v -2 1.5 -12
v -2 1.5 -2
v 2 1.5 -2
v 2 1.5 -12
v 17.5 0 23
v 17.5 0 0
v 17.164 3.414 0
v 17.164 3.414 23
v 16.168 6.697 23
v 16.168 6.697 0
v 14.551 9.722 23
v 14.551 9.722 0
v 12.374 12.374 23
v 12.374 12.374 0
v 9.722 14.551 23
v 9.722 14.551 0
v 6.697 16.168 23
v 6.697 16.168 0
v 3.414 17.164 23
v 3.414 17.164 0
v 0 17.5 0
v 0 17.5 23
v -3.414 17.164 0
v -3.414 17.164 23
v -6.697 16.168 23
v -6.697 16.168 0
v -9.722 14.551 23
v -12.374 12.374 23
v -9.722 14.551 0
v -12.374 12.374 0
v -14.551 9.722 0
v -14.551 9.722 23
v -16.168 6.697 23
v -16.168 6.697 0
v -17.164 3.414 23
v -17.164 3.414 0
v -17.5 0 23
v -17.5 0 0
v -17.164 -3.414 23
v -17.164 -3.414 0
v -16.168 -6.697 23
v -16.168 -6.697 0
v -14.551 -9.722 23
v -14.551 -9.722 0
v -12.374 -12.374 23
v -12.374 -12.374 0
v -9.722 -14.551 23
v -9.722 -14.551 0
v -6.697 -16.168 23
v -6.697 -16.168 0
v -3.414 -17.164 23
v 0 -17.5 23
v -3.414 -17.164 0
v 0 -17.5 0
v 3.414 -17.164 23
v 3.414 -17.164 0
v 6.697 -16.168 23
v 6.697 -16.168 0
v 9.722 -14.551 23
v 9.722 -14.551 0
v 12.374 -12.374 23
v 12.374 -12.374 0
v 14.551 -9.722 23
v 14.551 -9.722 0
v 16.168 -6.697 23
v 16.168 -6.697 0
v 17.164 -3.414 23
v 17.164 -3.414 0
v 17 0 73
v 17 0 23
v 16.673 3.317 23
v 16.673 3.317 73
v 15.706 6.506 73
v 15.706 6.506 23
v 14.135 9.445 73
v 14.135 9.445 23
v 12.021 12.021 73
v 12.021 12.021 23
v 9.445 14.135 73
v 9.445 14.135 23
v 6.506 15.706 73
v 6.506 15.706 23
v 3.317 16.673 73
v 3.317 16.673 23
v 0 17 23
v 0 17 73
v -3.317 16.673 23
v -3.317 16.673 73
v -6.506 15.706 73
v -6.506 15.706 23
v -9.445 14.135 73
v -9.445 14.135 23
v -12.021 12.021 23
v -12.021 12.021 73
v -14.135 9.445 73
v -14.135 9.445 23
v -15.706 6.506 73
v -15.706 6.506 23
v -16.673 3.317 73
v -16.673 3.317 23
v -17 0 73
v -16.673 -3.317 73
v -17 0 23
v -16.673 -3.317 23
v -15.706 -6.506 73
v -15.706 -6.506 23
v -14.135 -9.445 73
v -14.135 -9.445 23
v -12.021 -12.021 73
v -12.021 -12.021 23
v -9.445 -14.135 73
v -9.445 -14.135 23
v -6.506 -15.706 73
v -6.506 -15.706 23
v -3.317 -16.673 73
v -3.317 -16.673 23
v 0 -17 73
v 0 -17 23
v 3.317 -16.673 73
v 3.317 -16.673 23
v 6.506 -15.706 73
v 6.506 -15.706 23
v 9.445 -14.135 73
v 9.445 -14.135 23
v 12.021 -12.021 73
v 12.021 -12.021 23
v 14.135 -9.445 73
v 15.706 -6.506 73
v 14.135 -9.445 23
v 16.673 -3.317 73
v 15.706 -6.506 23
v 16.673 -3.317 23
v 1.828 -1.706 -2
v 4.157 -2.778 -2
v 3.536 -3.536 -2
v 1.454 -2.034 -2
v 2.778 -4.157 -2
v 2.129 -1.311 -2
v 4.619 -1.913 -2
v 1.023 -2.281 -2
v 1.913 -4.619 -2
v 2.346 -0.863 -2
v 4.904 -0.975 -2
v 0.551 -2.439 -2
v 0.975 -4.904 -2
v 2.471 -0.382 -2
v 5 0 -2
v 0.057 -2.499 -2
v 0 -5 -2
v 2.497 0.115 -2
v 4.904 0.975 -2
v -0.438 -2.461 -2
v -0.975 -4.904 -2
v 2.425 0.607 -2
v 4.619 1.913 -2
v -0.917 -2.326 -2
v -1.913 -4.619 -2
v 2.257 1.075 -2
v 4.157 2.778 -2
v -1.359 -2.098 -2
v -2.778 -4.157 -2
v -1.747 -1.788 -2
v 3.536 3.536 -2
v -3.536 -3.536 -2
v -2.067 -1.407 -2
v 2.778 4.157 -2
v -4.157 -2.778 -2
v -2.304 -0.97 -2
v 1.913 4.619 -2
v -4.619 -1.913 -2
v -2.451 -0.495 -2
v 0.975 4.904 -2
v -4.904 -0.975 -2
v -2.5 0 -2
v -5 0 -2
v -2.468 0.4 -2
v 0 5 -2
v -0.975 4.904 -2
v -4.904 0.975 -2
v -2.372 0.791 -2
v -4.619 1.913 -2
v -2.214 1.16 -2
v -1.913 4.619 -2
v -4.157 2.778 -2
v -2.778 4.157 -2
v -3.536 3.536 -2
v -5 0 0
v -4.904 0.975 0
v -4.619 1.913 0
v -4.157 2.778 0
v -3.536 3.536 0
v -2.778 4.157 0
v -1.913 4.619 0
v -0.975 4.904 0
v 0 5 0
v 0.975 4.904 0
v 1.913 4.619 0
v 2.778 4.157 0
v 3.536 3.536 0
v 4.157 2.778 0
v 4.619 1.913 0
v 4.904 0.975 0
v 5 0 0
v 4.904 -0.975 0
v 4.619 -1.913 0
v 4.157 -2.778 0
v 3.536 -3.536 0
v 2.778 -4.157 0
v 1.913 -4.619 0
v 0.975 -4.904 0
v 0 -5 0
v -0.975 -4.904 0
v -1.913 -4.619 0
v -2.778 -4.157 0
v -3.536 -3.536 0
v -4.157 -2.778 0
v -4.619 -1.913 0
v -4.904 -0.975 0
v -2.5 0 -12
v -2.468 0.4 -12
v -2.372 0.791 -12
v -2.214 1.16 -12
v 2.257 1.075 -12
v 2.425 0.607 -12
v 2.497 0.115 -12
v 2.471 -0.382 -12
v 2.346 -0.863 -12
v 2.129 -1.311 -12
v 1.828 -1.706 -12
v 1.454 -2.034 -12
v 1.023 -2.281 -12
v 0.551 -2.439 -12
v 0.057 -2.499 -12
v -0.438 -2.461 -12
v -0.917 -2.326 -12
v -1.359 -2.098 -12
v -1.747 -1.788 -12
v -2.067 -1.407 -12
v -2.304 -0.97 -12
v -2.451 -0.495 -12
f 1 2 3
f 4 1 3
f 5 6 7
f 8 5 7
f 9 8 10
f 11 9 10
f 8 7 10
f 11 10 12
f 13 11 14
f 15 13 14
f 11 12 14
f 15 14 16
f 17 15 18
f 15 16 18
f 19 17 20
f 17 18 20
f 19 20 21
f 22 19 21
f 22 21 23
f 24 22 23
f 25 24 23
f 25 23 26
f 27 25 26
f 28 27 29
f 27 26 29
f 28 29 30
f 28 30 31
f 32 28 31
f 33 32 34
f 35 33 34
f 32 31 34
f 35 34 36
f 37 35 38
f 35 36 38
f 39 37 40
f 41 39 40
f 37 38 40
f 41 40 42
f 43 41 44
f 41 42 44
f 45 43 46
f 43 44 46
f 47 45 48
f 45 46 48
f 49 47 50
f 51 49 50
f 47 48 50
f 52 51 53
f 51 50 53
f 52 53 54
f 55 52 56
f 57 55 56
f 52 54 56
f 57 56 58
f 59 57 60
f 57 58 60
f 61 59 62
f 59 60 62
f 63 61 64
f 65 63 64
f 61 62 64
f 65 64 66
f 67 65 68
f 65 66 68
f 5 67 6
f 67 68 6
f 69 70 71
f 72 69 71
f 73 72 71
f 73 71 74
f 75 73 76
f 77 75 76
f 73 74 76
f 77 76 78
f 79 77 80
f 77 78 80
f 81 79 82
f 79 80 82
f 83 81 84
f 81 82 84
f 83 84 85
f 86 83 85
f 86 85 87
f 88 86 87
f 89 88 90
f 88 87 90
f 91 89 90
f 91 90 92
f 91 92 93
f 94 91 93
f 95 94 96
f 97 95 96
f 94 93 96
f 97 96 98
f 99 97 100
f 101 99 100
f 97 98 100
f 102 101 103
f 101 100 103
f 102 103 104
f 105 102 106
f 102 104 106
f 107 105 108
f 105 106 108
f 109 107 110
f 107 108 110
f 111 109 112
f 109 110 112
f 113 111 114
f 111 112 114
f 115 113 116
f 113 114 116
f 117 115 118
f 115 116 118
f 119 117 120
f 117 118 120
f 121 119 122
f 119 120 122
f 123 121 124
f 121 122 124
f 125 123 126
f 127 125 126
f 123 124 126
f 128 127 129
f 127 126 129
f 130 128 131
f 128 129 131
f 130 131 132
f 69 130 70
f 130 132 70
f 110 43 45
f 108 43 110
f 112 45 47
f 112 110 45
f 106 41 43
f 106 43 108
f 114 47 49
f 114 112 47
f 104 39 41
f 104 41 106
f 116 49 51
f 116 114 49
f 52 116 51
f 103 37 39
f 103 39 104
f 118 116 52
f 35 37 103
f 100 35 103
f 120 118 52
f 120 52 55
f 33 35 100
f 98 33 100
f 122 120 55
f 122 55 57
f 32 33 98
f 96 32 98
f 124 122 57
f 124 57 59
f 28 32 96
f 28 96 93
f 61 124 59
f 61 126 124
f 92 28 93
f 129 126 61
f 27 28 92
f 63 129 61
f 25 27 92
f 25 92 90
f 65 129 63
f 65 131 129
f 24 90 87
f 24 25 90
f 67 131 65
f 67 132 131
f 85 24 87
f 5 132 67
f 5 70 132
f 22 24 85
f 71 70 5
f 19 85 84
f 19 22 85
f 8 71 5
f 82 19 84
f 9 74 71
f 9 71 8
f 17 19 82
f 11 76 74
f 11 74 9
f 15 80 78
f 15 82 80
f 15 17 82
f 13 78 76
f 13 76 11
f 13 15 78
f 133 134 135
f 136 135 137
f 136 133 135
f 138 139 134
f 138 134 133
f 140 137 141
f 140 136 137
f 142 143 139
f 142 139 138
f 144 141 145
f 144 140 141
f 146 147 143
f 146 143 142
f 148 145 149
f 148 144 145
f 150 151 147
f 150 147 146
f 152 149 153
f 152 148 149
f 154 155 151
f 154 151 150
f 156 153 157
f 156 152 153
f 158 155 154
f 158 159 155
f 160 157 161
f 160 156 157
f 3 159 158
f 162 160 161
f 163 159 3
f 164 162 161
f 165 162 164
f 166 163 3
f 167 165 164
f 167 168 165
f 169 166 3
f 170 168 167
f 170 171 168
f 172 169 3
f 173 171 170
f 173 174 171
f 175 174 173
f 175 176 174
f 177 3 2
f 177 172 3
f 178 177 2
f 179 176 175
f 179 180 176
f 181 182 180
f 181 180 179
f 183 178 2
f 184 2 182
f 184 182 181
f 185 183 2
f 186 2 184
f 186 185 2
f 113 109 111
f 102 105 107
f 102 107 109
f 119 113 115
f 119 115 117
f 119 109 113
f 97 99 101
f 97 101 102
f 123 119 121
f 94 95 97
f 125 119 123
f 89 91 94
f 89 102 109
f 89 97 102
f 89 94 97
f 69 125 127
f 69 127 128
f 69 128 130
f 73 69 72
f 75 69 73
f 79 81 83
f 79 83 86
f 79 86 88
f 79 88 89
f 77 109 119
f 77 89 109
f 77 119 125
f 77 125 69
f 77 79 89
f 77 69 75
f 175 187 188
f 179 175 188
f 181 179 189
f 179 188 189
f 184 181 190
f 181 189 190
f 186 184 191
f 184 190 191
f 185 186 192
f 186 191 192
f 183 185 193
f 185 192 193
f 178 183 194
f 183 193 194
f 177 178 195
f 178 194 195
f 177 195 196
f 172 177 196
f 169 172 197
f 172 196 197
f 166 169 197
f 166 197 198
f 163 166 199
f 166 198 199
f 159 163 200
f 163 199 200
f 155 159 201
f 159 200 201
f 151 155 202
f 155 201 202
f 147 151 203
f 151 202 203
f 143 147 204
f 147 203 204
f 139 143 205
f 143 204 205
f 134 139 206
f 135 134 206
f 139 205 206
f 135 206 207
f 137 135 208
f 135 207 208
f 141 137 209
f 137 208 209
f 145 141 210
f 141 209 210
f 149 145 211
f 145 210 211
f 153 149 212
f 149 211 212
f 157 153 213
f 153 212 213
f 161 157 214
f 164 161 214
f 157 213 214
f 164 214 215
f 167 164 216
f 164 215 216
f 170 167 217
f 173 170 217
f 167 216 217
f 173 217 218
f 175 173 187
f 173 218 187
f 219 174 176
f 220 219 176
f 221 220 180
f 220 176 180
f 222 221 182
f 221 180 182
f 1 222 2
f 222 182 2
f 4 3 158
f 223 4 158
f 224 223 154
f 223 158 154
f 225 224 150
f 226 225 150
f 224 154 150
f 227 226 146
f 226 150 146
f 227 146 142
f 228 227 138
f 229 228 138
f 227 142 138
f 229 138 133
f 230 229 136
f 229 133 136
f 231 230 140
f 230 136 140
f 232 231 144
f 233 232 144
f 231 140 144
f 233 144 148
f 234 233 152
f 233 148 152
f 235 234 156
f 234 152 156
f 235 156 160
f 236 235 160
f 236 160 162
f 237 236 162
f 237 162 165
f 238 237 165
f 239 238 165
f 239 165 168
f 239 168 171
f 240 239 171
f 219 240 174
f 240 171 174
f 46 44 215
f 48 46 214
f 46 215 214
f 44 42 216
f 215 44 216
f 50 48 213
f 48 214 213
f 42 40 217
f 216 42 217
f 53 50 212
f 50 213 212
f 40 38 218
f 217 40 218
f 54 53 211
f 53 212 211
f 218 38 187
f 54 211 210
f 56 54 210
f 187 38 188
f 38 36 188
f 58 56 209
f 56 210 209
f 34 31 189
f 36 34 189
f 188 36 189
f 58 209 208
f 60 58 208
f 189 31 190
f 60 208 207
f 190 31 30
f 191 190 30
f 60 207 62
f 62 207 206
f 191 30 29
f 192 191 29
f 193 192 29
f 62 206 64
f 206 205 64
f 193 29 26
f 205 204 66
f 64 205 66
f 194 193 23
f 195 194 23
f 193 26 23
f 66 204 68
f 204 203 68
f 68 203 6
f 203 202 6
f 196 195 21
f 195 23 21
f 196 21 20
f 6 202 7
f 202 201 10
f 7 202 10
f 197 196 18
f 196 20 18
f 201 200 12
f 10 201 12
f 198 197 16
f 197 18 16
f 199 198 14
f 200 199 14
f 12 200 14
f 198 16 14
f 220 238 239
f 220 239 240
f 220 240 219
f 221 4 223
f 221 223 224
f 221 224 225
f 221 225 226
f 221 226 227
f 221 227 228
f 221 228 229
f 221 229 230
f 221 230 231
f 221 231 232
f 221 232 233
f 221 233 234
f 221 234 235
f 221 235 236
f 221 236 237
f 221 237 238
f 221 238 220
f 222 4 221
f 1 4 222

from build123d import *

# Parameters (mm, degrees)
SKETCH1_R           = 17.5
BOSS_EXTRUDE1_DEPTH = 23
SKETCH2_R           = 17
BOSS_EXTRUDE2_DEPTH = 50
SKETCH3_R           = 5
BOSS_EXTRUDE3_DEPTH = 2
BOSS_EXTRUDE4_DEPTH = 10


with BuildPart() as part:
    # Sketch1 → Boss-Extrude1 (new body)
    with BuildSketch(Plane.XY):
        Circle(SKETCH1_R)
    extrude(amount=BOSS_EXTRUDE1_DEPTH)

    # Sketch2 → Boss-Extrude2 (add)
    with BuildSketch(Plane.XY.offset(23)):
        Circle(SKETCH2_R)
    extrude(amount=BOSS_EXTRUDE2_DEPTH)

    # Sketch3 → Boss-Extrude3 (add)
    with BuildSketch(Plane(origin=(0, 0, 0), x_dir=(-1, 0, 0), z_dir=(0, 0, -1))):
        Circle(SKETCH3_R)
    extrude(amount=BOSS_EXTRUDE3_DEPTH)

    # Sketch4 → Boss-Extrude4 (add)
    with BuildSketch(Plane(origin=(0, 0, -2), x_dir=(-1, 0, 0), z_dir=(0, 0, -1))):
        with BuildLine():
            Line((2, 1.5), (-2, 1.5))
            ThreePointArc((-2, 1.5), (-0.790569415, -2.371708245), (2.5, 0))
            ThreePointArc((2.5, 0), (2.371708245, 0.790569415), (2, 1.5))
        make_face()
    extrude(amount=BOSS_EXTRUDE4_DEPTH)


solid = part.part
